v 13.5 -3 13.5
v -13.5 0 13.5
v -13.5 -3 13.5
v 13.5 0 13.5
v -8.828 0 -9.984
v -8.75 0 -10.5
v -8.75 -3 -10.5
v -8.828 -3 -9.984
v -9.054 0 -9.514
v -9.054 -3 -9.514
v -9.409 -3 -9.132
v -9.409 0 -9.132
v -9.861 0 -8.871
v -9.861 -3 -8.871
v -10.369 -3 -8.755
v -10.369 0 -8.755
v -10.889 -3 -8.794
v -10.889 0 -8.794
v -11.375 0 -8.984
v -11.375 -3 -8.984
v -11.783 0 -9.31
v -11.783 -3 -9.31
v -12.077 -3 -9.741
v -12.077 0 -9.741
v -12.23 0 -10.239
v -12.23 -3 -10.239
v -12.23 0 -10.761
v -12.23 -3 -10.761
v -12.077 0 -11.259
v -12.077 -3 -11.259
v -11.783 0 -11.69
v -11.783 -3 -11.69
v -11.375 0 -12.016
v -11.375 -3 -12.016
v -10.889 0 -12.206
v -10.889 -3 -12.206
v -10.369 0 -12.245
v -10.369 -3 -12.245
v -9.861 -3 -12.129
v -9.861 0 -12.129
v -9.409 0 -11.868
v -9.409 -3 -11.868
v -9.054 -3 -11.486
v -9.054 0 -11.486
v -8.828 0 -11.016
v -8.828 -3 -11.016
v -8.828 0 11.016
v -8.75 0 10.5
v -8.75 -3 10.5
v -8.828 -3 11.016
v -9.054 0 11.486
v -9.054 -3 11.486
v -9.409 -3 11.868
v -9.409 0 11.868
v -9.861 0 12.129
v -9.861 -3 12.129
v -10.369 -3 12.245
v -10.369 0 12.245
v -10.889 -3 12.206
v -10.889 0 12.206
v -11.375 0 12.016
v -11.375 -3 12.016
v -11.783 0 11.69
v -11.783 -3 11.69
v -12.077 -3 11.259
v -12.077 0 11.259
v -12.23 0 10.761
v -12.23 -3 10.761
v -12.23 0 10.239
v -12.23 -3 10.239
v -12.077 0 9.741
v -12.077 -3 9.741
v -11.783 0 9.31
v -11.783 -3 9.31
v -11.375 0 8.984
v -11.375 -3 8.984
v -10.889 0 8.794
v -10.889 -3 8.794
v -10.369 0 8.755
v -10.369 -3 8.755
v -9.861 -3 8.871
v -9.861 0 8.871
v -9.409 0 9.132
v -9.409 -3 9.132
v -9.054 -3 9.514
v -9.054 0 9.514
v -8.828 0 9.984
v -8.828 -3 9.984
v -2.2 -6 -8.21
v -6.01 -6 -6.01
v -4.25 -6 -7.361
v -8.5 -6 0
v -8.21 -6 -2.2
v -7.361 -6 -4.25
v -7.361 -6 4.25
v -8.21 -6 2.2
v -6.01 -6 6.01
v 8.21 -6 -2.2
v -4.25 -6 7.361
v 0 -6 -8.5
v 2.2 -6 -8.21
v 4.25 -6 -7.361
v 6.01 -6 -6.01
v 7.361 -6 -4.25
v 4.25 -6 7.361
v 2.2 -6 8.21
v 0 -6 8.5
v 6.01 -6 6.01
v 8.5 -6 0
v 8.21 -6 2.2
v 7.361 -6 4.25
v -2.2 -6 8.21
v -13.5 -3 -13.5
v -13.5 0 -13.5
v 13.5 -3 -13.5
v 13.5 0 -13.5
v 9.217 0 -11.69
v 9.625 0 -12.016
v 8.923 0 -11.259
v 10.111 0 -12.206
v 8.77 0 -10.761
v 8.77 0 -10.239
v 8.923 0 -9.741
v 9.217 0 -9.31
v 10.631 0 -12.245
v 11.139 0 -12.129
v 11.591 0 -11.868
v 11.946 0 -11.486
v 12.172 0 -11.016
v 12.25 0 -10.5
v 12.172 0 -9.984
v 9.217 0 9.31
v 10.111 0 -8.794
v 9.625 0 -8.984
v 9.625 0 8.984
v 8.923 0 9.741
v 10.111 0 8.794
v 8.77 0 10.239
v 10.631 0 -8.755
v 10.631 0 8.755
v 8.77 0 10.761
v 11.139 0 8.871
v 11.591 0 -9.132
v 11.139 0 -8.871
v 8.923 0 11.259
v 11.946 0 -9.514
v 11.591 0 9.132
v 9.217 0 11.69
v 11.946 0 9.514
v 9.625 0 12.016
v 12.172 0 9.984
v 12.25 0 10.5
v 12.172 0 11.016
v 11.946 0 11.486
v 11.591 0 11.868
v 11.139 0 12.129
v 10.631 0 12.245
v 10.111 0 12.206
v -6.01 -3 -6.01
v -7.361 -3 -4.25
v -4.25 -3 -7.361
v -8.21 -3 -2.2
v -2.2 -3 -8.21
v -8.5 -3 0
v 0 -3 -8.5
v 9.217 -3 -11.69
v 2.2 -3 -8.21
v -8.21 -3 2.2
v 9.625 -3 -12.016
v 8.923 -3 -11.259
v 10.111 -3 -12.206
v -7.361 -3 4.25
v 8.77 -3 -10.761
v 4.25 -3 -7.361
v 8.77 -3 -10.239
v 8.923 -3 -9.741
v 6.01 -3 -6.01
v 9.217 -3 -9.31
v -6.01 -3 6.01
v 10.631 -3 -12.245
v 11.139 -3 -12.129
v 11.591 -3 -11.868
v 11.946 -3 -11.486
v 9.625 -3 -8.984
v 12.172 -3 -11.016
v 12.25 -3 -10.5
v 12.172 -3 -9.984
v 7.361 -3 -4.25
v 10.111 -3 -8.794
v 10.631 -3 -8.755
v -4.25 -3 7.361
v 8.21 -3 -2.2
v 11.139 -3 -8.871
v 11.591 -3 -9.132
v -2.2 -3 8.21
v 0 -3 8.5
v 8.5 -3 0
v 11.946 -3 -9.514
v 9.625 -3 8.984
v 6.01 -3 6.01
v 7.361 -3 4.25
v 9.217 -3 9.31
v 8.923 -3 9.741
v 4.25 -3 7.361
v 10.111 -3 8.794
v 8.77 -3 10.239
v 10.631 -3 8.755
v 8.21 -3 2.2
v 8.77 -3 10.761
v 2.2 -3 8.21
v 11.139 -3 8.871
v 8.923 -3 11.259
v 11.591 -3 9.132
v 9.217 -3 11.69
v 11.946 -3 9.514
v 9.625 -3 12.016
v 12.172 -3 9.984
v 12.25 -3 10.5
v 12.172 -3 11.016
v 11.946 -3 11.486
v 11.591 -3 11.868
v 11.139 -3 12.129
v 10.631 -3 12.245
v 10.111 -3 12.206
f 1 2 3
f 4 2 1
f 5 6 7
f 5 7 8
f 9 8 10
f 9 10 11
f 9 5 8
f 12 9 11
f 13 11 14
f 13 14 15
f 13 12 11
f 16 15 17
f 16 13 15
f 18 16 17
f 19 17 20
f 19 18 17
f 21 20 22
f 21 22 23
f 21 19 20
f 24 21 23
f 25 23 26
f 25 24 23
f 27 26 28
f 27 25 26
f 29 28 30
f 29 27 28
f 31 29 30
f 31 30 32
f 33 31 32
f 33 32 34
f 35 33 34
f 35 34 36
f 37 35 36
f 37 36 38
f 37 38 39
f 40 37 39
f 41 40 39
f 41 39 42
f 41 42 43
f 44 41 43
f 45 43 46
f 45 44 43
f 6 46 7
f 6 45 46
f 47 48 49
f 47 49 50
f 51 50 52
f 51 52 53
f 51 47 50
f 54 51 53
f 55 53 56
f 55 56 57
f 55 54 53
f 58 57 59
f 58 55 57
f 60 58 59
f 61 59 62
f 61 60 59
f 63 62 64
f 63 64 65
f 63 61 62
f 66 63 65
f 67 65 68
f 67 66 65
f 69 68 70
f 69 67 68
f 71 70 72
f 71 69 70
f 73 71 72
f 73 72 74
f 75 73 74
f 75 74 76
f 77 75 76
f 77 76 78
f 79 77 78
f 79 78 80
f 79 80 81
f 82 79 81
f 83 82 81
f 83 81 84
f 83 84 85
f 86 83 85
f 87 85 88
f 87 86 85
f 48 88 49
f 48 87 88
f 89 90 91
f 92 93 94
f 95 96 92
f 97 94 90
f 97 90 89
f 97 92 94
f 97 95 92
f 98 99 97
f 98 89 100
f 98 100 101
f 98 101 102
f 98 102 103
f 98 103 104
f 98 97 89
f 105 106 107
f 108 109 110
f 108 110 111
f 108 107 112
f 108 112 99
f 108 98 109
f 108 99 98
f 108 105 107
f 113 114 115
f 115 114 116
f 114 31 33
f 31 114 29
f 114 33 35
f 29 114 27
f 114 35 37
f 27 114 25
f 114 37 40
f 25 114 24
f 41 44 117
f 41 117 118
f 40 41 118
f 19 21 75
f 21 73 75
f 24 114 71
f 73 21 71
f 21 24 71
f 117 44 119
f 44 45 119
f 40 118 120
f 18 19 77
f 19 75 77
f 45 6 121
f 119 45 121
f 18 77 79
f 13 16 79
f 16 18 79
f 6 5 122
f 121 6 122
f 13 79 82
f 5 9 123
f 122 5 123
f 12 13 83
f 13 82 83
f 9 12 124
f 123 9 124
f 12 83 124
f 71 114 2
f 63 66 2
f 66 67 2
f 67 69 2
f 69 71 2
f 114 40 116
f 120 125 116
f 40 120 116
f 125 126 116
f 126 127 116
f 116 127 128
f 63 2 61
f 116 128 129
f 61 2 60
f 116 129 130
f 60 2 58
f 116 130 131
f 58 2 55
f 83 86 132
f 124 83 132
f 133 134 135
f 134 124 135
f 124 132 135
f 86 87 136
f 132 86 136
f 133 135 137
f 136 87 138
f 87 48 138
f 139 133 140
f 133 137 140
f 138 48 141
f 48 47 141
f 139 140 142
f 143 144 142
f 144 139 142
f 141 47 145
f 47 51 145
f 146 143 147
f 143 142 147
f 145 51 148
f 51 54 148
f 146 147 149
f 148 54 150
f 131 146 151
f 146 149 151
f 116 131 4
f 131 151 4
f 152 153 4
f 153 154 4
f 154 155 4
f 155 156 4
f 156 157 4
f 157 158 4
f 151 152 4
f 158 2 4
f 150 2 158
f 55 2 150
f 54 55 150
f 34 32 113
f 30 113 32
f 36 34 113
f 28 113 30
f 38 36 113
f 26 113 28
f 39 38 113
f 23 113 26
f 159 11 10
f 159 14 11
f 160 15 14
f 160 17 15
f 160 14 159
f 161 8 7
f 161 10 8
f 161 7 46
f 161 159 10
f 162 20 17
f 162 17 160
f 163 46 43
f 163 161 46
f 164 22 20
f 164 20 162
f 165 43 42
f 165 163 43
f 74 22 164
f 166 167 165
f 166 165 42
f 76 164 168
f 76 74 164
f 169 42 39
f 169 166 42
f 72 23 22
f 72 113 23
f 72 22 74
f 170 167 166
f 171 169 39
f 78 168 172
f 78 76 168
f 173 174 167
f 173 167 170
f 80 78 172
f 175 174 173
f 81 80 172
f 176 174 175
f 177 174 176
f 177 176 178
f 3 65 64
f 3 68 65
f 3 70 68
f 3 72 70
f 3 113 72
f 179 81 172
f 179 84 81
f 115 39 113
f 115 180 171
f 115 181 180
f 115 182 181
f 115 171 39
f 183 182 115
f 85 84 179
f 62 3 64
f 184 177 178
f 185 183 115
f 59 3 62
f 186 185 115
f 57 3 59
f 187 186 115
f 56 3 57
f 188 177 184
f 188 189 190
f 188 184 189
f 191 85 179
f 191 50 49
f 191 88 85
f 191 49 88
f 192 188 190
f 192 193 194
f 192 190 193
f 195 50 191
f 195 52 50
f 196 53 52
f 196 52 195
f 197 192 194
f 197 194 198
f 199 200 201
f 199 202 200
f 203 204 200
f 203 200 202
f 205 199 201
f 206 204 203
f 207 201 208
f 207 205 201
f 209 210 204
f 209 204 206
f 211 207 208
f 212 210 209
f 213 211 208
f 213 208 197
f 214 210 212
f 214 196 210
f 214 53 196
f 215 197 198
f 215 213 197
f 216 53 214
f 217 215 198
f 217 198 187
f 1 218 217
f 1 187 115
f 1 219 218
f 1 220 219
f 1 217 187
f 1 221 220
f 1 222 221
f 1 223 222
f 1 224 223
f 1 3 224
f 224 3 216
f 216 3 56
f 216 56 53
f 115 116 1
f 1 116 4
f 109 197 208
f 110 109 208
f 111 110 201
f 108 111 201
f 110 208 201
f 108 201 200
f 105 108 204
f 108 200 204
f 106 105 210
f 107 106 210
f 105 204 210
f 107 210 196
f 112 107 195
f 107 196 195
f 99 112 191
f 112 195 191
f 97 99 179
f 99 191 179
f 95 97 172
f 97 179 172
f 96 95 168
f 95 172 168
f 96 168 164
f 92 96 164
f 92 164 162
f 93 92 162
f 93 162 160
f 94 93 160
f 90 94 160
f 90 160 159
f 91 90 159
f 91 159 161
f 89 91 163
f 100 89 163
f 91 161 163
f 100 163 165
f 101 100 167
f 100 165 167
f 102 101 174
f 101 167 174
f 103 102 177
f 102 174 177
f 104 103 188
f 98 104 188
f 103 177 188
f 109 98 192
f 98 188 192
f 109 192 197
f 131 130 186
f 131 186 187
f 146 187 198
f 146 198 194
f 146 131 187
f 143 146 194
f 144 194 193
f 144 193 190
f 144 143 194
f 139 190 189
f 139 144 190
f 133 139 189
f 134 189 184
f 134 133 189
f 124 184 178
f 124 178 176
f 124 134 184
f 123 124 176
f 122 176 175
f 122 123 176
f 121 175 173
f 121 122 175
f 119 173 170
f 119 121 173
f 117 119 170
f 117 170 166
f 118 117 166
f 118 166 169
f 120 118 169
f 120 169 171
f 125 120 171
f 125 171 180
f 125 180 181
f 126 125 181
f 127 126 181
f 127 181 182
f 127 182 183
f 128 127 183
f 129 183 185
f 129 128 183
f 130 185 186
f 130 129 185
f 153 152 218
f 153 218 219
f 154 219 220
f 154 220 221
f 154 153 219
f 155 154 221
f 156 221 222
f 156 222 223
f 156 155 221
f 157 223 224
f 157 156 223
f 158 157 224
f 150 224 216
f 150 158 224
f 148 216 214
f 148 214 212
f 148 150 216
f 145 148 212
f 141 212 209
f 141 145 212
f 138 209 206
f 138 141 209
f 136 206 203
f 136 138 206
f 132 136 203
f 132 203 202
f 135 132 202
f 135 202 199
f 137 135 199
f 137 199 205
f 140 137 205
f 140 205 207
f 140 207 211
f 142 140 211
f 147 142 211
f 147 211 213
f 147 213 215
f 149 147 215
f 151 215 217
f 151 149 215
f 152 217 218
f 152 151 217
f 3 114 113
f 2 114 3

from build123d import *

# Parameters (mm, degrees)
F0_W     = 27
F0_H     = 27
F0_R     = 1.75
F1_DEPTH = 3
F2_R     = 8.5
F3_DEPTH = 3


with BuildPart() as f1:
    # F0 (on Front) → F1 (new body)
    with BuildSketch(Plane.XZ):
        Rectangle(F0_W, F0_H)
        with Locations((-10.5, -10.5)):
            Circle(F0_R, mode=Mode.SUBTRACT)
        with Locations((10.5, -10.5)):
            Circle(F0_R, mode=Mode.SUBTRACT)
        with Locations((-10.5, 10.5)):
            Circle(F0_R, mode=Mode.SUBTRACT)
        with Locations((10.5, 10.5)):
            Circle(F0_R, mode=Mode.SUBTRACT)
    extrude(amount=F1_DEPTH)

    # F2 (on face) → F3 (join)
    with BuildSketch(Plane.XZ.offset(3)):
        Circle(F2_R)
    extrude(amount=F3_DEPTH)


solid = f1.part
